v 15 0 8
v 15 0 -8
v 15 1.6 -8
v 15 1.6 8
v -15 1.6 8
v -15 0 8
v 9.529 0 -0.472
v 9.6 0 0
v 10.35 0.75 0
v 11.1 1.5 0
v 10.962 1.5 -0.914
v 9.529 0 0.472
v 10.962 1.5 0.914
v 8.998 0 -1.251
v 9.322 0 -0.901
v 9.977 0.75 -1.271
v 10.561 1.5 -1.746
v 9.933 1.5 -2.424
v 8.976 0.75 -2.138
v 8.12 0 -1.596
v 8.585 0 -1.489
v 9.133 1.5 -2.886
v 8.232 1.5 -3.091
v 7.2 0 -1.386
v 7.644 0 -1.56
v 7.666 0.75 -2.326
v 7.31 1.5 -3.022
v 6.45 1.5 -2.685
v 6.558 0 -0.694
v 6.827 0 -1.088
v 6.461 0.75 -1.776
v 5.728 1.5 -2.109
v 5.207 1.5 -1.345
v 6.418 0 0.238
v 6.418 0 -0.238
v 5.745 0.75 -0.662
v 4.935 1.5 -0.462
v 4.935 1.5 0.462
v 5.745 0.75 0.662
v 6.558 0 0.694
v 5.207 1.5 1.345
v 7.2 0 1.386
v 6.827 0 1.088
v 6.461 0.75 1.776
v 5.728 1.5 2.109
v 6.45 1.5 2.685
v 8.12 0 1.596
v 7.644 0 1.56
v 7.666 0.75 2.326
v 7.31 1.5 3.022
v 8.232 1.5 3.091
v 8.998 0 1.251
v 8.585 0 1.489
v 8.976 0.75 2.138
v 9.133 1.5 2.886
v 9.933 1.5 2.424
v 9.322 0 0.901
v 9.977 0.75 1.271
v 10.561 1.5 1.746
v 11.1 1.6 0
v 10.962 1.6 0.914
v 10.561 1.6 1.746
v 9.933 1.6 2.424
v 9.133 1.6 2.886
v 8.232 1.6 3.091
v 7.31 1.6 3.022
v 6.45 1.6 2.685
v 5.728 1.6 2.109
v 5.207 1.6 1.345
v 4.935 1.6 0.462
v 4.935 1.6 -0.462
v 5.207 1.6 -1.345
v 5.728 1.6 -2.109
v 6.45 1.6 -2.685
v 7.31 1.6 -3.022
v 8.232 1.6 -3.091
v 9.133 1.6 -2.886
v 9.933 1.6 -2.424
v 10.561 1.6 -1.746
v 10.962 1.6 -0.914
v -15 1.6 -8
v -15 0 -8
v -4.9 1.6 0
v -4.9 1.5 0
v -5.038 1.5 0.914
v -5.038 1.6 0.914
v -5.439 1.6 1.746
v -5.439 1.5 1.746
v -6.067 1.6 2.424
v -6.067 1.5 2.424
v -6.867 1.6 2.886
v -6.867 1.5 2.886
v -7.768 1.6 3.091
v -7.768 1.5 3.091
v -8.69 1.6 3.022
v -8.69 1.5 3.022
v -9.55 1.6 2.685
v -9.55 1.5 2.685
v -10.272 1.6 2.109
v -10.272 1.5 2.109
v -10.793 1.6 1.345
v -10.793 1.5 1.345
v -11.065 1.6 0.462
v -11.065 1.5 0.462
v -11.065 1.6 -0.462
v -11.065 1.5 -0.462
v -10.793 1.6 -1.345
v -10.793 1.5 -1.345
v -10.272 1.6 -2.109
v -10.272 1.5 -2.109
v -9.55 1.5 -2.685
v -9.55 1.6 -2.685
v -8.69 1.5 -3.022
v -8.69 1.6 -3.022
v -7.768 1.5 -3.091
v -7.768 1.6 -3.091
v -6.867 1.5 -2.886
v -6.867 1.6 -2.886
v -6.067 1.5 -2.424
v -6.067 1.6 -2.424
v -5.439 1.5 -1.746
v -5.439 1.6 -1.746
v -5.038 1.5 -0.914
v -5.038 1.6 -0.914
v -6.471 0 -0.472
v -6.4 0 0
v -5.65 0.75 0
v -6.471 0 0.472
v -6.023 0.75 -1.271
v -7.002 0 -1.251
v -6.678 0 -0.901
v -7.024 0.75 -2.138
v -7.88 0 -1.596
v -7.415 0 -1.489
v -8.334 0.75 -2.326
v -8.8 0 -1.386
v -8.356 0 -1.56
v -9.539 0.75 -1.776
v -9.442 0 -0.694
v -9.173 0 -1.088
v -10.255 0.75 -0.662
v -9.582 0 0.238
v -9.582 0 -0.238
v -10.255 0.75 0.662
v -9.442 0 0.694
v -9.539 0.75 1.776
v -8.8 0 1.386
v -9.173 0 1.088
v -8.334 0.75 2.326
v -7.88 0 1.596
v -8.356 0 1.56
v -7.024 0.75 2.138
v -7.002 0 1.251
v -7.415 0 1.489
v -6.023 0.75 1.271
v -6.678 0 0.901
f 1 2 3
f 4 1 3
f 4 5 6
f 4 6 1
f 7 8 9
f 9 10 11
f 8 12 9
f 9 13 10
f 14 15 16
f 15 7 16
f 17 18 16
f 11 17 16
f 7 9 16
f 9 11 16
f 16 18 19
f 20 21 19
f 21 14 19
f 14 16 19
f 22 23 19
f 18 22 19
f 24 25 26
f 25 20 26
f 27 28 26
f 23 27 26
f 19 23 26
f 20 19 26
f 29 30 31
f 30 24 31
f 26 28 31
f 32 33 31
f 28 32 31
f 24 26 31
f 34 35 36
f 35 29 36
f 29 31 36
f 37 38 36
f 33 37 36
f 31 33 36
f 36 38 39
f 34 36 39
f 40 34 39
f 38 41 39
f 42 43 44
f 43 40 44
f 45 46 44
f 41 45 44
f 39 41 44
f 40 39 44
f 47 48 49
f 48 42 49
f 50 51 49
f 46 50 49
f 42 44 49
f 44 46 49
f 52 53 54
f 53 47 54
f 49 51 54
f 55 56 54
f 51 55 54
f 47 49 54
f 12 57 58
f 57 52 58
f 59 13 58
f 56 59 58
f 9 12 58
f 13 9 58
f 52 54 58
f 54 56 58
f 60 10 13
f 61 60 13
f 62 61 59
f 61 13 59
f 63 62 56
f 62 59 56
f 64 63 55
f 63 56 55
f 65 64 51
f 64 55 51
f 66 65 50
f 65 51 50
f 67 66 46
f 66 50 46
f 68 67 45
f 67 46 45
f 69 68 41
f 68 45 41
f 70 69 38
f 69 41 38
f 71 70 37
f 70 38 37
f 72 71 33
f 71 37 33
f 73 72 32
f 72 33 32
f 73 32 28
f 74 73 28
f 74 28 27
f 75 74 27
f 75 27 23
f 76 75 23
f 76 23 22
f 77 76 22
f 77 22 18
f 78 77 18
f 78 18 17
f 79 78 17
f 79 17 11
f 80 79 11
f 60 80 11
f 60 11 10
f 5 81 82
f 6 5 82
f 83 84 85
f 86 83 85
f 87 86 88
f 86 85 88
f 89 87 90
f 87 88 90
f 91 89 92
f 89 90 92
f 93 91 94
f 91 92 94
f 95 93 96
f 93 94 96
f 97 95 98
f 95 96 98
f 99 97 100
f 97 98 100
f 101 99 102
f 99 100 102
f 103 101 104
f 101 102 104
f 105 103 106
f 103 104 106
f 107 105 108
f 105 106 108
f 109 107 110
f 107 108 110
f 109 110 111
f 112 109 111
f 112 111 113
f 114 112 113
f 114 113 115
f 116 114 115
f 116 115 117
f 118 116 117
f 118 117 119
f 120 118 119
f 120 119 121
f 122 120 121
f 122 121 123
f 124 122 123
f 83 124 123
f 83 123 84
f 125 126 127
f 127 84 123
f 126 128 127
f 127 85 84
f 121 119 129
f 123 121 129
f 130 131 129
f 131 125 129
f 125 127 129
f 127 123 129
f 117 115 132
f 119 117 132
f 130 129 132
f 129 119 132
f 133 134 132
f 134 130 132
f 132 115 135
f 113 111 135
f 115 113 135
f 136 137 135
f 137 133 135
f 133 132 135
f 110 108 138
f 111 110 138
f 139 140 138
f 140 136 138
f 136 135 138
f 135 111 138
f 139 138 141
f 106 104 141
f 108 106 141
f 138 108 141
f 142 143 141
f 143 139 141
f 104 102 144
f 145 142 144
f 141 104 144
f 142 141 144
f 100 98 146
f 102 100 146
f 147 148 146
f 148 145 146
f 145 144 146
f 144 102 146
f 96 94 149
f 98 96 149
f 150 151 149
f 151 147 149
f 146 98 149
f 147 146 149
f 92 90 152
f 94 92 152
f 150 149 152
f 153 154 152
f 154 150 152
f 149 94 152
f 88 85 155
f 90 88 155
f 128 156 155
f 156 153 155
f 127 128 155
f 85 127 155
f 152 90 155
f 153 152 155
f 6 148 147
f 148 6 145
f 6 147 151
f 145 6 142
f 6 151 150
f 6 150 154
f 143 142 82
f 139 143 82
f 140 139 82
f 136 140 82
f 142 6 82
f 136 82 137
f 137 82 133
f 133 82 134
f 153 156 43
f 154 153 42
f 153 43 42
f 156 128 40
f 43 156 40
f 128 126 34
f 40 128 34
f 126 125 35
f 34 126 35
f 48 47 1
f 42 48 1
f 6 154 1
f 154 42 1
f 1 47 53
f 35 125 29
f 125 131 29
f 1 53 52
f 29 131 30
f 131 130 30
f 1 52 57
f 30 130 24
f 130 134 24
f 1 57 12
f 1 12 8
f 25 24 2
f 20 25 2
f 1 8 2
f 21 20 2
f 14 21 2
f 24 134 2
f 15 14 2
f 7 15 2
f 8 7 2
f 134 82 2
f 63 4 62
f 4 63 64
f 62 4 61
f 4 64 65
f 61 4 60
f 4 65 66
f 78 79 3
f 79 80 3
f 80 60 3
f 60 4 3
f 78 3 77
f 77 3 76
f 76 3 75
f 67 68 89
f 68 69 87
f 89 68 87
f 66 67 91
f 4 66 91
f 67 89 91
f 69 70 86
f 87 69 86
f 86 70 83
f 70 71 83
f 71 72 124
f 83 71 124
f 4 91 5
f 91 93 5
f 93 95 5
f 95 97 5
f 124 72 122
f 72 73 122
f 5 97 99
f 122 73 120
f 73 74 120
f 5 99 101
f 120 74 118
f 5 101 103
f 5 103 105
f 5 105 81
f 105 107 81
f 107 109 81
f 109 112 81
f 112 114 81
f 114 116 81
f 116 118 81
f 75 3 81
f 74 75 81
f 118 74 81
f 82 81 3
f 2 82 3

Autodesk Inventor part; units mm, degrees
sketch "Sketch_1" plane through (0, 0, 0) normal (0, 0, 1) x (1, 0, 0)
  line L0 (-15, 0) -> (15, 0)
  line L1 (15, 0) -> (15, 1.6)
  line L2 (15, 1.6) -> (-15, 1.6)
  line L3 (-15, 1.6) -> (-15, 0)
extrude "Extrusion1" add sketch "Sketch_1" along normal mid plane 16
sketch "Sketch_2" plane through (0, 0, 0) normal (0, 0, 1) x (1, 0, 0)
  line L0 (8, 0) -> (8, 1.6)
  line L1 (8, 1.6) -> (11.1, 1.6)
  line L2 (11.1, 1.6) -> (11.1, 1.5)
  line L3 (11.1, 1.5) -> (9.6, 0)
  line L4 (9.6, 0) -> (8, 0)
  line L5 (8, 0) -> (8, 1.6)
revolve "Revolution1" cut sketch "Sketch_2" angle 360 about axis through (8, 0, 0) along (0, -1, 0)
sketch "Sketch_3" plane through (0, 0, 0) normal (0, 0, 1) x (1, 0, 0)
  line L0 (-8, 0) -> (-8, 1.6)
  line L1 (-8, 1.6) -> (-4.9, 1.6)
  line L2 (-4.9, 1.6) -> (-4.9, 1.5)
  line L3 (-4.9, 1.5) -> (-6.4, 0)
  line L4 (-6.4, 0) -> (-8, 0)
  line L5 (-8, 0) -> (-8, 1.6)
revolve "Revolution2" cut sketch "Sketch_3" angle 360 about axis through (-8, 0, 0) along (0, -1, 0)
ref_plane "to_magnet_XY" through (0, 1.6, 0) normal (0, -1, 0) x (1, 0, 0)
ref_plane "to_magnet_YZ" through (0, 1.6, 0) normal (1, 0, 0) x (0, 0, 1)
ref_plane "to_magnet_ZX" through (0, 1.6, 0) normal (0, 0, 1) x (0, -1, 0)
ref_plane "to_bolt1_XY" through (-8, 0.1, 0) normal (0, 1, 0) x (1, 0, 0)
ref_plane "to_bolt1_YZ" through (-8, 0.1, 0) normal (1, 0, 0) x (0, 0, -1)
ref_plane "to_bolt1_ZX" through (-8, 0.1, 0) normal (0, 0, -1) x (0, 1, 0)
ref_plane "to_bolt2_XY" through (8, 0.1, 0) normal (0, 1, 0) x (1, 0, 0)
ref_plane "to_bolt2_YZ" through (8, 0.1, 0) normal (1, 0, 0) x (0, 0, -1)
ref_plane "to_bolt2_ZX" through (8, 0.1, 0) normal (0, 0, -1) x (0, 1, 0)
properties part number "MGCE1plate5-5"
